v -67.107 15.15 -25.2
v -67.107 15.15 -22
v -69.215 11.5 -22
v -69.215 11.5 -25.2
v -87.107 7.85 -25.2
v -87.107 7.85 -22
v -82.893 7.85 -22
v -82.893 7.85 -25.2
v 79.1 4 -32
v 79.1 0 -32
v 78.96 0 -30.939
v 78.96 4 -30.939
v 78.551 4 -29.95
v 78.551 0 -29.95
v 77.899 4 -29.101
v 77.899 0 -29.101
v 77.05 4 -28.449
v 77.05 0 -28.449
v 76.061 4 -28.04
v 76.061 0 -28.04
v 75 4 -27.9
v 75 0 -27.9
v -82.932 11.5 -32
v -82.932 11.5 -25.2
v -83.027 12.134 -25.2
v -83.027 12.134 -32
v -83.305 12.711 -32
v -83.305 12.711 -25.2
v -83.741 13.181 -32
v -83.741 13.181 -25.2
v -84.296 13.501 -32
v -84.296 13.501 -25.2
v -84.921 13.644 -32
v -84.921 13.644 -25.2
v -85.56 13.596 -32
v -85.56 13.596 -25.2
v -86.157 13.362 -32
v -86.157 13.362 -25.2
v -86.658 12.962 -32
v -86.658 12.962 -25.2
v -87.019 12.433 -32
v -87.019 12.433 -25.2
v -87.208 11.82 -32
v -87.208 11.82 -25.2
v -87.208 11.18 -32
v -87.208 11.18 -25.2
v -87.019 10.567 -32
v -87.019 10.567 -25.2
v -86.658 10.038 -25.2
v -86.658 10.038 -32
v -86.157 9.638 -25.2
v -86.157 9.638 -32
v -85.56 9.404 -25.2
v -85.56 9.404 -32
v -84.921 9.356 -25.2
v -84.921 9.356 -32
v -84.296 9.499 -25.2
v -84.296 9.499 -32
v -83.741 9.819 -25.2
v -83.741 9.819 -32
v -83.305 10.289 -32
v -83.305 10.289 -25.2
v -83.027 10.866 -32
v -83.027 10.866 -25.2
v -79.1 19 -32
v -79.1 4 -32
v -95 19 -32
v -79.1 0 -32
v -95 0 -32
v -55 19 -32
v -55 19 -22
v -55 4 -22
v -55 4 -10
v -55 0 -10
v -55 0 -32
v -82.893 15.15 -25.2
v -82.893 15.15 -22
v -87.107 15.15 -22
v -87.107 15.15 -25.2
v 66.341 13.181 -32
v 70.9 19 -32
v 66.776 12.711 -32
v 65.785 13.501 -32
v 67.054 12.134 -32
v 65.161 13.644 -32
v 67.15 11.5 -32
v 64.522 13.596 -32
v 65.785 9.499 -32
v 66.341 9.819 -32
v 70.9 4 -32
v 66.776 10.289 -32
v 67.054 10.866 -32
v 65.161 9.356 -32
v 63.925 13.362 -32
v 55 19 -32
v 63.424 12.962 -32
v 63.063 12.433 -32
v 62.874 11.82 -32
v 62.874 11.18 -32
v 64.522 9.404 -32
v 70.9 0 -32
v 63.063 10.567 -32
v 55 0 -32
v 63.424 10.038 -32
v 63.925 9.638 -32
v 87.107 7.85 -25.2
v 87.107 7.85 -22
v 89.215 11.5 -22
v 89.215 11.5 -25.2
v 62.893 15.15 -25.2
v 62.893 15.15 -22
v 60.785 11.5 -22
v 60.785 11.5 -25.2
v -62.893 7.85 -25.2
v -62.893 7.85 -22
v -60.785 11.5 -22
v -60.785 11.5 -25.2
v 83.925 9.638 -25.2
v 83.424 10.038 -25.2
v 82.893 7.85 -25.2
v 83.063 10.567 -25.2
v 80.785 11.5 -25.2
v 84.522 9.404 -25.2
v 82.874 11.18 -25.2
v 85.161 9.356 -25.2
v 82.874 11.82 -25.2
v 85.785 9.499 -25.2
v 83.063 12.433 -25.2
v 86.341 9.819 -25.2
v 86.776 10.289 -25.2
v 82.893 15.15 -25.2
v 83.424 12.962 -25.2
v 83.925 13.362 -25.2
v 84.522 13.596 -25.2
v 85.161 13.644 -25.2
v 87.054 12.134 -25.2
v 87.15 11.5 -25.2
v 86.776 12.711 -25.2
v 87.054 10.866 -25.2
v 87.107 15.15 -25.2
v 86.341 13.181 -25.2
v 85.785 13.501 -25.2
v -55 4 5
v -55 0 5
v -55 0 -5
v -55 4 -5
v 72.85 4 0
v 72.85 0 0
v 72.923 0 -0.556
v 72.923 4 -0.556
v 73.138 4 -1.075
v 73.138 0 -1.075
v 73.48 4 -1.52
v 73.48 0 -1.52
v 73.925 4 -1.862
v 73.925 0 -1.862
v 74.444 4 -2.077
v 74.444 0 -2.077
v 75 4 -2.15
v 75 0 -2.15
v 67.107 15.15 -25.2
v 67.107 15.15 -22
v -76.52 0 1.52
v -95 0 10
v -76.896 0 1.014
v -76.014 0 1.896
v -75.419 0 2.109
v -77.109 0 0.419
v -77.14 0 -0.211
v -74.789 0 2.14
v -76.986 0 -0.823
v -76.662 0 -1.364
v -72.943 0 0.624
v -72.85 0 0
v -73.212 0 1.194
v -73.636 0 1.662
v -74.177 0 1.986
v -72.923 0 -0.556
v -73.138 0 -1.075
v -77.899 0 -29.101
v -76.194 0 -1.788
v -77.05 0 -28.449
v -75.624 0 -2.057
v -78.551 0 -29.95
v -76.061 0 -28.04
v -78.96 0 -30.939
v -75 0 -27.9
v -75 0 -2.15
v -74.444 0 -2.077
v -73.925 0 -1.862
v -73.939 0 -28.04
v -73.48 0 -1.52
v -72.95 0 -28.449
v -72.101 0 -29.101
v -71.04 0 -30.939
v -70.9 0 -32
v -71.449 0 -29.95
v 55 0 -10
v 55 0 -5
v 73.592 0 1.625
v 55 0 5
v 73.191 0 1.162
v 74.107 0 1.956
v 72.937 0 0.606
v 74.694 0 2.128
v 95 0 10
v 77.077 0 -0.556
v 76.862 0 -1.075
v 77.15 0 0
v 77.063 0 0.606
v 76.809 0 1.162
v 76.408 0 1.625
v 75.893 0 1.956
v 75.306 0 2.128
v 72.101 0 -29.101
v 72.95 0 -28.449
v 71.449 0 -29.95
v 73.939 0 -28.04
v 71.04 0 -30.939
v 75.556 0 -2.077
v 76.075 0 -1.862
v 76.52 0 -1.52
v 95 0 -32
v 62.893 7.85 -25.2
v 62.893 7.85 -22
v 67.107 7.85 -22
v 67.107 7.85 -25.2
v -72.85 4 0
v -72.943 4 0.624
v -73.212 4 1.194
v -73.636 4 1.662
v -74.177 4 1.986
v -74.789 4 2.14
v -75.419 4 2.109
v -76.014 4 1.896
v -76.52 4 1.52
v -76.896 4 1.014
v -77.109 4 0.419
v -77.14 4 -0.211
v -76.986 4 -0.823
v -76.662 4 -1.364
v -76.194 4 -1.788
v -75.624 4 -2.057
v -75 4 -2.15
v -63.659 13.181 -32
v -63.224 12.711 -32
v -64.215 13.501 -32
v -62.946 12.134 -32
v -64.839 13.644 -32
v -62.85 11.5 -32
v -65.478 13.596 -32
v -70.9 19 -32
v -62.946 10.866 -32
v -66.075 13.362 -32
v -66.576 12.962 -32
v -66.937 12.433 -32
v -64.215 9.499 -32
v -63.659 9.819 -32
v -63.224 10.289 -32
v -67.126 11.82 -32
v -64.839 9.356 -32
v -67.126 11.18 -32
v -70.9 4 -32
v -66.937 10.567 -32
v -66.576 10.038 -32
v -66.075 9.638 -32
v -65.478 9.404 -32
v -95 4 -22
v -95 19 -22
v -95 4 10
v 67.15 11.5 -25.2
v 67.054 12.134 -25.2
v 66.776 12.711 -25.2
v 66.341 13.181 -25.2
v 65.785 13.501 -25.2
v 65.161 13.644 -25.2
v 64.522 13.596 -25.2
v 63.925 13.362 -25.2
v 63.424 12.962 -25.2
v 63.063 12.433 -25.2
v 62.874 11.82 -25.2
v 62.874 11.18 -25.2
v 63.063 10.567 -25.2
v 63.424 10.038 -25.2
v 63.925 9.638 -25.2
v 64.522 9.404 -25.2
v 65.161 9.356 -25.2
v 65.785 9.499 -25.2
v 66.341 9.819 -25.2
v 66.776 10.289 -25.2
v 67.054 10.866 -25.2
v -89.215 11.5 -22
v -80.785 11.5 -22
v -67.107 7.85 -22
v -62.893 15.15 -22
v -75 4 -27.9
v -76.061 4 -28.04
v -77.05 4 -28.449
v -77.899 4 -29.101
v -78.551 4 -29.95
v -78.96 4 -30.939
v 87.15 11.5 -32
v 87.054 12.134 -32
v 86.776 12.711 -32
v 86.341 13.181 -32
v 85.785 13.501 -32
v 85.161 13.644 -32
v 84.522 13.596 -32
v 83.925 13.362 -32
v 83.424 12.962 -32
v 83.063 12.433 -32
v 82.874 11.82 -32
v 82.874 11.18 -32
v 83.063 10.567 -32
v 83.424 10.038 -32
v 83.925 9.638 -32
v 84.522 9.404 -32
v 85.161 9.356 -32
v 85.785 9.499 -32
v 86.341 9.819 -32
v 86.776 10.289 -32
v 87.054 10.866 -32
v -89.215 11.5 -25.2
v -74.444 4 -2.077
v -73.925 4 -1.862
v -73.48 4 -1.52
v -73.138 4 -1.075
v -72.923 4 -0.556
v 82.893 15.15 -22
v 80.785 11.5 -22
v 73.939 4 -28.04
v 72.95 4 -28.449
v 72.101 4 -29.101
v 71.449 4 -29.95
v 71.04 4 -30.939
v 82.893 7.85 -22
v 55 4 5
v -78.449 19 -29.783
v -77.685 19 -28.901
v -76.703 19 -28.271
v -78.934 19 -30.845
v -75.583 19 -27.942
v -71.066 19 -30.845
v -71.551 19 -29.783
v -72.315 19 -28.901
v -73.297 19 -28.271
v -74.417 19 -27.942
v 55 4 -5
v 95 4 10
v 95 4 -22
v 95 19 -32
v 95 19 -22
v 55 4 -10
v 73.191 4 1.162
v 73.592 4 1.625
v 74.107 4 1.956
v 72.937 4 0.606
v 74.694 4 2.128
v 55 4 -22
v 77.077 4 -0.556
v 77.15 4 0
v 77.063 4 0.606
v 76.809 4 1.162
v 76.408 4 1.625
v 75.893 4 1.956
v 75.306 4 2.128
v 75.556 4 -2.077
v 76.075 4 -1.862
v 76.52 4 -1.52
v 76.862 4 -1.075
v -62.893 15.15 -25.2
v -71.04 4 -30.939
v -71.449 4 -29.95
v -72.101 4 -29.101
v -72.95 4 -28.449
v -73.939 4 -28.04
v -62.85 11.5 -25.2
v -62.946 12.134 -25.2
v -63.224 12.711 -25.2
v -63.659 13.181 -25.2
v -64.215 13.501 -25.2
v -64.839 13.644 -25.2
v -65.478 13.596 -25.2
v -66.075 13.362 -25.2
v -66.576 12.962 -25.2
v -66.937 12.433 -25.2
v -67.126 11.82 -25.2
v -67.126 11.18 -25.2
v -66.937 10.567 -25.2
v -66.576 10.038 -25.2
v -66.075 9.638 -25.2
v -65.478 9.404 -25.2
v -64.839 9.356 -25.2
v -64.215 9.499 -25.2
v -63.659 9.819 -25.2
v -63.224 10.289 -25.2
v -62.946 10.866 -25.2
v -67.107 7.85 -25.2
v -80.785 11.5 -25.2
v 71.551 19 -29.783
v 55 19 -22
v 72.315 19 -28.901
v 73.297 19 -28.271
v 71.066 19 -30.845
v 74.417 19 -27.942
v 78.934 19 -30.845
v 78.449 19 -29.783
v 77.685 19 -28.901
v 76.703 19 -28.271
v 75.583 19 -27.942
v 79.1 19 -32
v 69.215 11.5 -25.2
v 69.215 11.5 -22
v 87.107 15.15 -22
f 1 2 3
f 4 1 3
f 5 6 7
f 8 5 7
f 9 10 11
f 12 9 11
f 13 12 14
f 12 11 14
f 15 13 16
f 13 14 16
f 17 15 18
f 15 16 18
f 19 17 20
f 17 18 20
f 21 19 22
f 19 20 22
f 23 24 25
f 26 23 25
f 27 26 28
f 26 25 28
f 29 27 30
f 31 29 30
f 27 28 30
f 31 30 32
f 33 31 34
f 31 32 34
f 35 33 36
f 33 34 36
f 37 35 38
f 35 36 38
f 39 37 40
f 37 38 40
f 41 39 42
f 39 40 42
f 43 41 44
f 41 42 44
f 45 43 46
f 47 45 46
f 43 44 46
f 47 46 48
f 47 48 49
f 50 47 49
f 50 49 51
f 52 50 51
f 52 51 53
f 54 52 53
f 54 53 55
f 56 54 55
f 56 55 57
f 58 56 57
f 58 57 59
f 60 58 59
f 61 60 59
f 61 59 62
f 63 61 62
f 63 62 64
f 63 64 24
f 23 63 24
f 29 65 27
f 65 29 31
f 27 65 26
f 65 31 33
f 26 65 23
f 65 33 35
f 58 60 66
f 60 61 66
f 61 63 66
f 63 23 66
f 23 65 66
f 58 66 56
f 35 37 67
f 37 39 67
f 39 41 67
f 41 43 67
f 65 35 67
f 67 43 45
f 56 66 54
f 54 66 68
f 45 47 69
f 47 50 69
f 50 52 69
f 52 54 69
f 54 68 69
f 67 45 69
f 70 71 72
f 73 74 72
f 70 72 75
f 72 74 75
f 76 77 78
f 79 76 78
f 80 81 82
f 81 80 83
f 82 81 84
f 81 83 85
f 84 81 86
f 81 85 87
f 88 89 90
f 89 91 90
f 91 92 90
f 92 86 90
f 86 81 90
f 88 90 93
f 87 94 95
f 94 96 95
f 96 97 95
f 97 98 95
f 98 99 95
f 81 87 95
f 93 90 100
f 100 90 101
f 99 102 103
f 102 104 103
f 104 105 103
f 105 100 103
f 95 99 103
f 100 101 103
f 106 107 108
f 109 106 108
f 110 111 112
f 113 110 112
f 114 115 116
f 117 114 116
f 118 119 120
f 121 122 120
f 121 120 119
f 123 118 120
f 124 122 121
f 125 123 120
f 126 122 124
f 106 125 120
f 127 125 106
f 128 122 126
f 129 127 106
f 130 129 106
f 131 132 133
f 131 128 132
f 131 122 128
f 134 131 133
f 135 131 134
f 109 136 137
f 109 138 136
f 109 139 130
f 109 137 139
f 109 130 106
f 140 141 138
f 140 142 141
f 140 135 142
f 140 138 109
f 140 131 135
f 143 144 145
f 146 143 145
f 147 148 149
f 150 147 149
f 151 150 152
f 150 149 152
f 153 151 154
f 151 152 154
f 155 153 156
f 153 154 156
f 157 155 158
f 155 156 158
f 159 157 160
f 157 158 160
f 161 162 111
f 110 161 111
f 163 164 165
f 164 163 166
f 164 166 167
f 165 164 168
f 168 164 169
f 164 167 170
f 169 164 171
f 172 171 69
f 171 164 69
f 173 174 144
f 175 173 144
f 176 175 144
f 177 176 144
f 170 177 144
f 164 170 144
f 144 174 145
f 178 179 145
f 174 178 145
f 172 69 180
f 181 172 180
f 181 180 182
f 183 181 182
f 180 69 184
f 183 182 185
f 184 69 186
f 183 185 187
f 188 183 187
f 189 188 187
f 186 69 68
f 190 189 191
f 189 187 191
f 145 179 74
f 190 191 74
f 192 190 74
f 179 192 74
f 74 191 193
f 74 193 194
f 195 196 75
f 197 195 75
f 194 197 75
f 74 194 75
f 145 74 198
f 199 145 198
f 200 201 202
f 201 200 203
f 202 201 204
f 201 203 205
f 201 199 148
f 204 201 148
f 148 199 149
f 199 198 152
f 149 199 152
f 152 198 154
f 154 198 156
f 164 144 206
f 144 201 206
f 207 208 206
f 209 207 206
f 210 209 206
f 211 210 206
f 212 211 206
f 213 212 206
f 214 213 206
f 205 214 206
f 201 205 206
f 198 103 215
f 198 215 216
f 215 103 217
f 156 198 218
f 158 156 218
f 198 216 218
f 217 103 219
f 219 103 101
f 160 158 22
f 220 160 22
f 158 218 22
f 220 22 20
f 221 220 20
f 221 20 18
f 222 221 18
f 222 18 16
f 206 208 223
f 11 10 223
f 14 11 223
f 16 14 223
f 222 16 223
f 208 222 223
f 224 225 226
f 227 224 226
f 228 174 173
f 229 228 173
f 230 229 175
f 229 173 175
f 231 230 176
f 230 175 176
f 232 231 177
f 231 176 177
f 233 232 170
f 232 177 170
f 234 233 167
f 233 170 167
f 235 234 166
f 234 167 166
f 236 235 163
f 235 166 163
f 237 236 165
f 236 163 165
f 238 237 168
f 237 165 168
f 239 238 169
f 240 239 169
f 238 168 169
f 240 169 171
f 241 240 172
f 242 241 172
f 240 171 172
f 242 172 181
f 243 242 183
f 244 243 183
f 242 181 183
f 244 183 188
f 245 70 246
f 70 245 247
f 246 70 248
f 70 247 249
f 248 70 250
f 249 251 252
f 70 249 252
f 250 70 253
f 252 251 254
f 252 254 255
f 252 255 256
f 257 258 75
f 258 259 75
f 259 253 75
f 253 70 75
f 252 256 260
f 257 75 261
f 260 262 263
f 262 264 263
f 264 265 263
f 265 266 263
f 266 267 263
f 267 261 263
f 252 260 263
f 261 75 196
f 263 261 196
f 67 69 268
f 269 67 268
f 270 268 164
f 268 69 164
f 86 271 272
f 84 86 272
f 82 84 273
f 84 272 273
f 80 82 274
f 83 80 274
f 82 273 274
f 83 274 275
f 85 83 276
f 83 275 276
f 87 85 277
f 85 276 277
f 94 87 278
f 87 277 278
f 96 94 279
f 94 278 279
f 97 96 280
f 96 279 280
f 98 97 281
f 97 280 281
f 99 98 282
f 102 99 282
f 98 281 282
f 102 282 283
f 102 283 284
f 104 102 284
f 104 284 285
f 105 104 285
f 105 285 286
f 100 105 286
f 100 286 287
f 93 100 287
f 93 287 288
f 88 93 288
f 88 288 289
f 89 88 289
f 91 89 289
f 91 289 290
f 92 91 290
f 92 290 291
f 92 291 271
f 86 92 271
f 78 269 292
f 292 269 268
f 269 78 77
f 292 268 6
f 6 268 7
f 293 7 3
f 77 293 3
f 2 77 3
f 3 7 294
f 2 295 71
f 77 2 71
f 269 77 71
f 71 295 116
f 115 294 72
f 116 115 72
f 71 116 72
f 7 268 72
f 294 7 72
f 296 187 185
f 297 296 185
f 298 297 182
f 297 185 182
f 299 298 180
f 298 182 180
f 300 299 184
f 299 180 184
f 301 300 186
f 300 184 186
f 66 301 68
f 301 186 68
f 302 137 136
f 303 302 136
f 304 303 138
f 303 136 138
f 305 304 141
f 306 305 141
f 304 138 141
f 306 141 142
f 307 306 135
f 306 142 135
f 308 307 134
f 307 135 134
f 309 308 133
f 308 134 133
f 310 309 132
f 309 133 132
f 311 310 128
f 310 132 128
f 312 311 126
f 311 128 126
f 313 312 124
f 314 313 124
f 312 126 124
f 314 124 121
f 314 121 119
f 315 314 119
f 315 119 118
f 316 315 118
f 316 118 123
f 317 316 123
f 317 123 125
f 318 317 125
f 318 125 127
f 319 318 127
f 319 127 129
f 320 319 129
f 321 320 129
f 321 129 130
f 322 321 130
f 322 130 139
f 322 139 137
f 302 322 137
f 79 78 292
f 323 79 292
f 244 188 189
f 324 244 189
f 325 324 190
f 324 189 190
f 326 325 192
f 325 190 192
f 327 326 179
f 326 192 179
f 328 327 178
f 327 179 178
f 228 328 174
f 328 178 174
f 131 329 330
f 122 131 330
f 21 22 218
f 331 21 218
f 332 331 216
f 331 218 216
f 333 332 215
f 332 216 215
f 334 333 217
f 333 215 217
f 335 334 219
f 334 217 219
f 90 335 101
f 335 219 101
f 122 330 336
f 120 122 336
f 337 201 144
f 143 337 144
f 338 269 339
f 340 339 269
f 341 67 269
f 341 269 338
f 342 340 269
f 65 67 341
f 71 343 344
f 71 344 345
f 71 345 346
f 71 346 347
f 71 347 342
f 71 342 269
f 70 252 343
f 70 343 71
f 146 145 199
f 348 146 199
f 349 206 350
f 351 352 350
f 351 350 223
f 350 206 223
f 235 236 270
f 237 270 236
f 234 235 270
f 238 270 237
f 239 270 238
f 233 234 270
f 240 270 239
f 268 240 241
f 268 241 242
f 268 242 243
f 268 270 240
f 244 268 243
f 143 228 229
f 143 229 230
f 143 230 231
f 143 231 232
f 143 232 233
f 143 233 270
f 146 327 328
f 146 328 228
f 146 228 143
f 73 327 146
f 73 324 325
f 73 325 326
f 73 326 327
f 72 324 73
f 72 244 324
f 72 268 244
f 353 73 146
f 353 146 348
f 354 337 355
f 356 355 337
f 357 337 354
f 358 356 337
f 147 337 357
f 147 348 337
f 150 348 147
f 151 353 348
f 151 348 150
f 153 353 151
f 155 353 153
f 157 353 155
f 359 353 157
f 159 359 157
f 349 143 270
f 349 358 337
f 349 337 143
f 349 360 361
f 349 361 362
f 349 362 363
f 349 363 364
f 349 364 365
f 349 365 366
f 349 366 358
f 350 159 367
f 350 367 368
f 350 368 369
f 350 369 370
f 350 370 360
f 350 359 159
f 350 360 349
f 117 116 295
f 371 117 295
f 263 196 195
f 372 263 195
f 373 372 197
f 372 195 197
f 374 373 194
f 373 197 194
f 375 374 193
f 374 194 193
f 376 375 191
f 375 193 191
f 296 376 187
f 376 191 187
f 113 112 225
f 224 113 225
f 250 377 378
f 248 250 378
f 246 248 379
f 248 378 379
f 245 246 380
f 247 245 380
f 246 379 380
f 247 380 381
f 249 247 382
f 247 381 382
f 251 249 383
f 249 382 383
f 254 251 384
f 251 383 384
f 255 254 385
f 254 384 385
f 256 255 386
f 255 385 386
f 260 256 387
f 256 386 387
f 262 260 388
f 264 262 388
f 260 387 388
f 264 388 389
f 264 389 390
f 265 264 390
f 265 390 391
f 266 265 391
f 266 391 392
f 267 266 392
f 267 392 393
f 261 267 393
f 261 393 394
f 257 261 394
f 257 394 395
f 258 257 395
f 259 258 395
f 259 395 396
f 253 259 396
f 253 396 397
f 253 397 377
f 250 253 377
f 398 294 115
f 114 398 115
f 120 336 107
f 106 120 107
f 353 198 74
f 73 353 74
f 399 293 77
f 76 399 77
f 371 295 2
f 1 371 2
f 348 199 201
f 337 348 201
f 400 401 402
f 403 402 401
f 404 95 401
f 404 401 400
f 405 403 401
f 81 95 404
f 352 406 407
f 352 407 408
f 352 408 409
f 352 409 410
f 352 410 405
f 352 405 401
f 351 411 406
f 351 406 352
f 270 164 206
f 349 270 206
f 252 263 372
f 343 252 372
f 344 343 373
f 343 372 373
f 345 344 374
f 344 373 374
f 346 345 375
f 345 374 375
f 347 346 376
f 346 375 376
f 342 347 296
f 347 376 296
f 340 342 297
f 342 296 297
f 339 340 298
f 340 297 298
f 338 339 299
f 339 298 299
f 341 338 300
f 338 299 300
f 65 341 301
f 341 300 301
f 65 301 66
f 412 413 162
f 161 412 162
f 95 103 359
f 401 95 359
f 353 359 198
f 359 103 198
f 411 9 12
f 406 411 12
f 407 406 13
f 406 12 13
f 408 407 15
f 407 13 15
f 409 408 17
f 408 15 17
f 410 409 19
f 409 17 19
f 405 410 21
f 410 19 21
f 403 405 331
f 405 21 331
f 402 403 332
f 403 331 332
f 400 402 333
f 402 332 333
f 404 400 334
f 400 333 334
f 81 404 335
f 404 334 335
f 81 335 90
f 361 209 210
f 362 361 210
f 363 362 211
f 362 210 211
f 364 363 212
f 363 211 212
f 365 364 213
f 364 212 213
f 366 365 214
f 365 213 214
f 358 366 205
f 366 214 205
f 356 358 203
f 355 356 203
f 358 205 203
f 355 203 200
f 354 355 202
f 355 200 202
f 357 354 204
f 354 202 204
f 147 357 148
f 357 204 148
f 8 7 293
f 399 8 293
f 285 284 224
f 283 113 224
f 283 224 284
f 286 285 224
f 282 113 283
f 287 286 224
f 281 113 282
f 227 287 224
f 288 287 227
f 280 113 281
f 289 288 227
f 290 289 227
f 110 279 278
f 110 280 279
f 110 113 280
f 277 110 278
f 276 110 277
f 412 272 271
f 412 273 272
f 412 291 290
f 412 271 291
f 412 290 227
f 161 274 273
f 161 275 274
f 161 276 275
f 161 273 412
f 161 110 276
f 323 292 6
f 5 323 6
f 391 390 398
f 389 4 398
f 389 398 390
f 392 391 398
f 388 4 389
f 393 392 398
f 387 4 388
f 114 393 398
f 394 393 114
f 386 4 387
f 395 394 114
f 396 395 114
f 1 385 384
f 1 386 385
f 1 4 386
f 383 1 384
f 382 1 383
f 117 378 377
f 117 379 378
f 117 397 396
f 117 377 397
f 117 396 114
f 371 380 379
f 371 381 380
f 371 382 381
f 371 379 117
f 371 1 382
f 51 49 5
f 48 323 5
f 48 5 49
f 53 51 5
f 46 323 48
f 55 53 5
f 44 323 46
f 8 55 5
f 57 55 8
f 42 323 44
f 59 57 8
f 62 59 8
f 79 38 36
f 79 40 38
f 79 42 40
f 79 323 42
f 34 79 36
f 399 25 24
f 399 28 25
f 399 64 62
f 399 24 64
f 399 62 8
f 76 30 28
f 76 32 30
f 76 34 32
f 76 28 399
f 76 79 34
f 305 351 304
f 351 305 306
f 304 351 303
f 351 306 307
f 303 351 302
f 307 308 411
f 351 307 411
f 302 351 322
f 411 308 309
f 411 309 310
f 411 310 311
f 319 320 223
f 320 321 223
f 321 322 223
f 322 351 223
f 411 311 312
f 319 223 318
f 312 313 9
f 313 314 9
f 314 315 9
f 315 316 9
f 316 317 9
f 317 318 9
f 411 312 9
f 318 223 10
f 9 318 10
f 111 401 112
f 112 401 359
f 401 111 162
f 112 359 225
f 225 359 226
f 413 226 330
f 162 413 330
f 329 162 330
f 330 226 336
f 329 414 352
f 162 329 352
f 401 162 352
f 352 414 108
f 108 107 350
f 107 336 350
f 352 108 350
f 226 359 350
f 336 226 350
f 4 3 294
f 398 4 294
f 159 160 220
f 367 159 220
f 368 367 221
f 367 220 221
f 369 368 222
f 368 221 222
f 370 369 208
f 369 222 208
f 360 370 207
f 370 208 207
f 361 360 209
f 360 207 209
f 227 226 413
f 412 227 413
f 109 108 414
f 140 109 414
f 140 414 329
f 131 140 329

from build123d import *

# Parameters (mm, degrees)
SKIZZE1_W                       = 55
SKIZZE1_H                       = 5
AUFSATZ_LINEAR_AUSTRAGEN1_DEPTH = 4
AUFSATZ_LINEAR_AUSTRAGEN2_DEPTH = 15
SCHNITT_LINEAR_AUSTRAGEN1_DEPTH = 3.2
SCHNITT_LINEAR_AUSTRAGEN2_DEPTH = 15


with BuildPart() as part:
    # Skizze1 → Aufsatz-Linear austragen1 (new body)
    with BuildSketch(Plane(origin=(0, 0, 0), x_dir=(1, 0, 0), z_dir=(0, 1, 0))):
        with BuildLine():
            Line((-55, -5), (-55, 0))
            Line((-55, 0), (-72.85, 0))
            ThreePointArc((-72.85, 0), (-76.52027958, -1.52027958), (-75, 2.15))
            Line((-75, 2.15), (-75, 27.9))
            ThreePointArc((-75, 27.9), (-77.899137803, 29.100862197), (-79.1, 32))
            Line((-79.1, 32), (-95, 32))
            Line((-95, 32), (-95, -10))
            Line((-95, -10), (-55, -10))
            Line((-55, -10), (-55, -5))
        make_face()
        with BuildLine():
            Line((-72.85, 0), (-55, 0))
            Line((-55, 0), (-55, 5))
            Line((-55, 5), (-55, 10))
            Line((-55, 10), (-55, 32))
            Line((-55, 32), (-70.9, 32))
            ThreePointArc((-70.9, 32), (-72.100862197, 29.100862197), (-75, 27.9))
            Line((-75, 27.9), (-75, 2.15))
            ThreePointArc((-75, 2.15), (-73.47972042, 1.52027958), (-72.85, 0))
        make_face()
        with Locations((-27.5, 7.5)):
            Rectangle(SKIZZE1_W, SKIZZE1_H)
        with Locations((27.5, 7.5)):
            Rectangle(SKIZZE1_W, SKIZZE1_H)
        with BuildLine():
            Line((55, 5), (55, 0))
            Line((55, 0), (72.85, 0))
            ThreePointArc((72.85, 0), (73.47972042, 1.52027958), (75, 2.15))
            Line((75, 2.15), (75, 27.9))
            ThreePointArc((75, 27.9), (72.100862197, 29.100862197), (70.9, 32))
            Line((70.9, 32), (55, 32))
            Line((55, 32), (55, 10))
            Line((55, 10), (55, 5))
        make_face()
        with BuildLine():
            Line((72.85, 0), (55, 0))
            Line((55, 0), (55, -5))
            Line((55, -5), (55, -10))
            Line((55, -10), (95, -10))
            Line((95, -10), (95, 32))
            Line((95, 32), (79.1, 32))
            ThreePointArc((79.1, 32), (77.899137803, 29.100862197), (75, 27.9))
            Line((75, 27.9), (75, 2.15))
            ThreePointArc((75, 2.15), (76.52027958, 1.52027958), (77.15, 0))
            ThreePointArc((77.15, 0), (75, -2.15), (72.85, 0))
        make_face()
        with Locations((27.5, -7.5)):
            Rectangle(SKIZZE1_W, SKIZZE1_H)
        with Locations((-27.5, -7.5)):
            Rectangle(SKIZZE1_W, SKIZZE1_H)
    extrude(amount=AUFSATZ_LINEAR_AUSTRAGEN1_DEPTH)

    # Skizze2 → Aufsatz-Linear austragen2 (add)
    with BuildSketch(Plane(origin=(0, 4, 0), x_dir=(1, 0, 0), z_dir=(0, 1, 0))):
        with BuildLine():
            Line((-95, 32), (-95, 22))
            Line((-95, 22), (-55, 22))
            Line((-55, 22), (-55, 32))
            Line((-55, 32), (-70.9, 32))
            ThreePointArc((-70.9, 32), (-75, 27.9), (-79.1, 32))
            Line((-79.1, 32), (-95, 32))
        make_face()
        with BuildLine():
            Line((55, 32), (55, 22))
            Line((55, 22), (95, 22))
            Line((95, 22), (95, 32))
            Line((95, 32), (79.1, 32))
            ThreePointArc((79.1, 32), (75, 27.9), (70.9, 32))
            Line((70.9, 32), (55, 32))
        make_face()
    extrude(amount=AUFSATZ_LINEAR_AUSTRAGEN2_DEPTH)

    # Skizze3 → Schnitt-Linear austragen1 (cut)
    with BuildSketch(Plane.XY.offset(-22)):
        Polygon((-87.107328483, 15.15), (-89.214656965, 11.5), (-85, 11.5), (-80.785343035, 11.5), (-82.892671517, 15.15), align=None)
        Polygon((-85, 11.5), (-89.214656965, 11.5), (-87.107328483, 7.85), (-82.892671517, 7.85), (-80.785343035, 11.5), align=None)
        Polygon((-67.107328483, 15.15), (-69.214656965, 11.5), (-65, 11.5), (-60.785343035, 11.5), (-62.892671517, 15.15), align=None)
        Polygon((-65, 11.5), (-69.214656965, 11.5), (-67.107328483, 7.85), (-62.892671517, 7.85), (-60.785343035, 11.5), align=None)
        Polygon((85, 11.5), (89.214656965, 11.5), (87.107328483, 15.15), (82.892671517, 15.15), (80.785343035, 11.5), align=None)
        Polygon((87.107328483, 7.85), (89.214656965, 11.5), (85, 11.5), (80.785343035, 11.5), (82.892671517, 7.85), align=None)
        Polygon((65, 11.5), (69.214656965, 11.5), (67.107328483, 15.15), (62.892671517, 15.15), (60.785343035, 11.5), align=None)
        Polygon((67.107328483, 7.85), (69.214656965, 11.5), (65, 11.5), (60.785343035, 11.5), (62.892671517, 7.85), align=None)
    extrude(amount=-SCHNITT_LINEAR_AUSTRAGEN1_DEPTH, mode=Mode.SUBTRACT)

    # Skizze4 → Schnitt-Linear austragen2 (cut)
    with BuildSketch(Plane.XY.offset(-22)):
        with BuildLine():
            ThreePointArc((-87.231768347, 11.5), (-85.081768347, 9.35), (-82.931768347, 11.5))
            Line((-82.931768347, 11.5), (-85.081768347, 11.5))
            Line((-85.081768347, 11.5), (-87.231768347, 11.5))
        make_face()
        with BuildLine():
            Line((-85.081768347, 11.5), (-82.931768347, 11.5))
            ThreePointArc((-82.931768347, 11.5), (-85.081768347, 13.65), (-87.231768347, 11.5))
            Line((-87.231768347, 11.5), (-85.081768347, 11.5))
        make_face()
        with BuildLine():
            ThreePointArc((-67.15, 11.5), (-65, 9.35), (-62.85, 11.5))
            Line((-62.85, 11.5), (-65, 11.5))
            Line((-65, 11.5), (-67.15, 11.5))
        make_face()
        with BuildLine():
            Line((-65, 11.5), (-62.85, 11.5))
            ThreePointArc((-62.85, 11.5), (-65, 13.65), (-67.15, 11.5))
            Line((-67.15, 11.5), (-65, 11.5))
        make_face()
        with BuildLine():
            ThreePointArc((62.85, 11.5), (65, 9.35), (67.15, 11.5))
            Line((67.15, 11.5), (65, 11.5))
            Line((65, 11.5), (62.85, 11.5))
        make_face()
        with BuildLine():
            Line((65, 11.5), (67.15, 11.5))
            ThreePointArc((67.15, 11.5), (65, 13.65), (62.85, 11.5))
            Line((62.85, 11.5), (65, 11.5))
        make_face()
        with BuildLine():
            ThreePointArc((82.85, 11.5), (85, 9.35), (87.15, 11.5))
            Line((87.15, 11.5), (85, 11.5))
            Line((85, 11.5), (82.85, 11.5))
        make_face()
        with BuildLine():
            Line((85, 11.5), (87.15, 11.5))
            ThreePointArc((87.15, 11.5), (85, 13.65), (82.85, 11.5))
            Line((82.85, 11.5), (85, 11.5))
        make_face()
    extrude(amount=-SCHNITT_LINEAR_AUSTRAGEN2_DEPTH, mode=Mode.SUBTRACT)


solid = part.part
